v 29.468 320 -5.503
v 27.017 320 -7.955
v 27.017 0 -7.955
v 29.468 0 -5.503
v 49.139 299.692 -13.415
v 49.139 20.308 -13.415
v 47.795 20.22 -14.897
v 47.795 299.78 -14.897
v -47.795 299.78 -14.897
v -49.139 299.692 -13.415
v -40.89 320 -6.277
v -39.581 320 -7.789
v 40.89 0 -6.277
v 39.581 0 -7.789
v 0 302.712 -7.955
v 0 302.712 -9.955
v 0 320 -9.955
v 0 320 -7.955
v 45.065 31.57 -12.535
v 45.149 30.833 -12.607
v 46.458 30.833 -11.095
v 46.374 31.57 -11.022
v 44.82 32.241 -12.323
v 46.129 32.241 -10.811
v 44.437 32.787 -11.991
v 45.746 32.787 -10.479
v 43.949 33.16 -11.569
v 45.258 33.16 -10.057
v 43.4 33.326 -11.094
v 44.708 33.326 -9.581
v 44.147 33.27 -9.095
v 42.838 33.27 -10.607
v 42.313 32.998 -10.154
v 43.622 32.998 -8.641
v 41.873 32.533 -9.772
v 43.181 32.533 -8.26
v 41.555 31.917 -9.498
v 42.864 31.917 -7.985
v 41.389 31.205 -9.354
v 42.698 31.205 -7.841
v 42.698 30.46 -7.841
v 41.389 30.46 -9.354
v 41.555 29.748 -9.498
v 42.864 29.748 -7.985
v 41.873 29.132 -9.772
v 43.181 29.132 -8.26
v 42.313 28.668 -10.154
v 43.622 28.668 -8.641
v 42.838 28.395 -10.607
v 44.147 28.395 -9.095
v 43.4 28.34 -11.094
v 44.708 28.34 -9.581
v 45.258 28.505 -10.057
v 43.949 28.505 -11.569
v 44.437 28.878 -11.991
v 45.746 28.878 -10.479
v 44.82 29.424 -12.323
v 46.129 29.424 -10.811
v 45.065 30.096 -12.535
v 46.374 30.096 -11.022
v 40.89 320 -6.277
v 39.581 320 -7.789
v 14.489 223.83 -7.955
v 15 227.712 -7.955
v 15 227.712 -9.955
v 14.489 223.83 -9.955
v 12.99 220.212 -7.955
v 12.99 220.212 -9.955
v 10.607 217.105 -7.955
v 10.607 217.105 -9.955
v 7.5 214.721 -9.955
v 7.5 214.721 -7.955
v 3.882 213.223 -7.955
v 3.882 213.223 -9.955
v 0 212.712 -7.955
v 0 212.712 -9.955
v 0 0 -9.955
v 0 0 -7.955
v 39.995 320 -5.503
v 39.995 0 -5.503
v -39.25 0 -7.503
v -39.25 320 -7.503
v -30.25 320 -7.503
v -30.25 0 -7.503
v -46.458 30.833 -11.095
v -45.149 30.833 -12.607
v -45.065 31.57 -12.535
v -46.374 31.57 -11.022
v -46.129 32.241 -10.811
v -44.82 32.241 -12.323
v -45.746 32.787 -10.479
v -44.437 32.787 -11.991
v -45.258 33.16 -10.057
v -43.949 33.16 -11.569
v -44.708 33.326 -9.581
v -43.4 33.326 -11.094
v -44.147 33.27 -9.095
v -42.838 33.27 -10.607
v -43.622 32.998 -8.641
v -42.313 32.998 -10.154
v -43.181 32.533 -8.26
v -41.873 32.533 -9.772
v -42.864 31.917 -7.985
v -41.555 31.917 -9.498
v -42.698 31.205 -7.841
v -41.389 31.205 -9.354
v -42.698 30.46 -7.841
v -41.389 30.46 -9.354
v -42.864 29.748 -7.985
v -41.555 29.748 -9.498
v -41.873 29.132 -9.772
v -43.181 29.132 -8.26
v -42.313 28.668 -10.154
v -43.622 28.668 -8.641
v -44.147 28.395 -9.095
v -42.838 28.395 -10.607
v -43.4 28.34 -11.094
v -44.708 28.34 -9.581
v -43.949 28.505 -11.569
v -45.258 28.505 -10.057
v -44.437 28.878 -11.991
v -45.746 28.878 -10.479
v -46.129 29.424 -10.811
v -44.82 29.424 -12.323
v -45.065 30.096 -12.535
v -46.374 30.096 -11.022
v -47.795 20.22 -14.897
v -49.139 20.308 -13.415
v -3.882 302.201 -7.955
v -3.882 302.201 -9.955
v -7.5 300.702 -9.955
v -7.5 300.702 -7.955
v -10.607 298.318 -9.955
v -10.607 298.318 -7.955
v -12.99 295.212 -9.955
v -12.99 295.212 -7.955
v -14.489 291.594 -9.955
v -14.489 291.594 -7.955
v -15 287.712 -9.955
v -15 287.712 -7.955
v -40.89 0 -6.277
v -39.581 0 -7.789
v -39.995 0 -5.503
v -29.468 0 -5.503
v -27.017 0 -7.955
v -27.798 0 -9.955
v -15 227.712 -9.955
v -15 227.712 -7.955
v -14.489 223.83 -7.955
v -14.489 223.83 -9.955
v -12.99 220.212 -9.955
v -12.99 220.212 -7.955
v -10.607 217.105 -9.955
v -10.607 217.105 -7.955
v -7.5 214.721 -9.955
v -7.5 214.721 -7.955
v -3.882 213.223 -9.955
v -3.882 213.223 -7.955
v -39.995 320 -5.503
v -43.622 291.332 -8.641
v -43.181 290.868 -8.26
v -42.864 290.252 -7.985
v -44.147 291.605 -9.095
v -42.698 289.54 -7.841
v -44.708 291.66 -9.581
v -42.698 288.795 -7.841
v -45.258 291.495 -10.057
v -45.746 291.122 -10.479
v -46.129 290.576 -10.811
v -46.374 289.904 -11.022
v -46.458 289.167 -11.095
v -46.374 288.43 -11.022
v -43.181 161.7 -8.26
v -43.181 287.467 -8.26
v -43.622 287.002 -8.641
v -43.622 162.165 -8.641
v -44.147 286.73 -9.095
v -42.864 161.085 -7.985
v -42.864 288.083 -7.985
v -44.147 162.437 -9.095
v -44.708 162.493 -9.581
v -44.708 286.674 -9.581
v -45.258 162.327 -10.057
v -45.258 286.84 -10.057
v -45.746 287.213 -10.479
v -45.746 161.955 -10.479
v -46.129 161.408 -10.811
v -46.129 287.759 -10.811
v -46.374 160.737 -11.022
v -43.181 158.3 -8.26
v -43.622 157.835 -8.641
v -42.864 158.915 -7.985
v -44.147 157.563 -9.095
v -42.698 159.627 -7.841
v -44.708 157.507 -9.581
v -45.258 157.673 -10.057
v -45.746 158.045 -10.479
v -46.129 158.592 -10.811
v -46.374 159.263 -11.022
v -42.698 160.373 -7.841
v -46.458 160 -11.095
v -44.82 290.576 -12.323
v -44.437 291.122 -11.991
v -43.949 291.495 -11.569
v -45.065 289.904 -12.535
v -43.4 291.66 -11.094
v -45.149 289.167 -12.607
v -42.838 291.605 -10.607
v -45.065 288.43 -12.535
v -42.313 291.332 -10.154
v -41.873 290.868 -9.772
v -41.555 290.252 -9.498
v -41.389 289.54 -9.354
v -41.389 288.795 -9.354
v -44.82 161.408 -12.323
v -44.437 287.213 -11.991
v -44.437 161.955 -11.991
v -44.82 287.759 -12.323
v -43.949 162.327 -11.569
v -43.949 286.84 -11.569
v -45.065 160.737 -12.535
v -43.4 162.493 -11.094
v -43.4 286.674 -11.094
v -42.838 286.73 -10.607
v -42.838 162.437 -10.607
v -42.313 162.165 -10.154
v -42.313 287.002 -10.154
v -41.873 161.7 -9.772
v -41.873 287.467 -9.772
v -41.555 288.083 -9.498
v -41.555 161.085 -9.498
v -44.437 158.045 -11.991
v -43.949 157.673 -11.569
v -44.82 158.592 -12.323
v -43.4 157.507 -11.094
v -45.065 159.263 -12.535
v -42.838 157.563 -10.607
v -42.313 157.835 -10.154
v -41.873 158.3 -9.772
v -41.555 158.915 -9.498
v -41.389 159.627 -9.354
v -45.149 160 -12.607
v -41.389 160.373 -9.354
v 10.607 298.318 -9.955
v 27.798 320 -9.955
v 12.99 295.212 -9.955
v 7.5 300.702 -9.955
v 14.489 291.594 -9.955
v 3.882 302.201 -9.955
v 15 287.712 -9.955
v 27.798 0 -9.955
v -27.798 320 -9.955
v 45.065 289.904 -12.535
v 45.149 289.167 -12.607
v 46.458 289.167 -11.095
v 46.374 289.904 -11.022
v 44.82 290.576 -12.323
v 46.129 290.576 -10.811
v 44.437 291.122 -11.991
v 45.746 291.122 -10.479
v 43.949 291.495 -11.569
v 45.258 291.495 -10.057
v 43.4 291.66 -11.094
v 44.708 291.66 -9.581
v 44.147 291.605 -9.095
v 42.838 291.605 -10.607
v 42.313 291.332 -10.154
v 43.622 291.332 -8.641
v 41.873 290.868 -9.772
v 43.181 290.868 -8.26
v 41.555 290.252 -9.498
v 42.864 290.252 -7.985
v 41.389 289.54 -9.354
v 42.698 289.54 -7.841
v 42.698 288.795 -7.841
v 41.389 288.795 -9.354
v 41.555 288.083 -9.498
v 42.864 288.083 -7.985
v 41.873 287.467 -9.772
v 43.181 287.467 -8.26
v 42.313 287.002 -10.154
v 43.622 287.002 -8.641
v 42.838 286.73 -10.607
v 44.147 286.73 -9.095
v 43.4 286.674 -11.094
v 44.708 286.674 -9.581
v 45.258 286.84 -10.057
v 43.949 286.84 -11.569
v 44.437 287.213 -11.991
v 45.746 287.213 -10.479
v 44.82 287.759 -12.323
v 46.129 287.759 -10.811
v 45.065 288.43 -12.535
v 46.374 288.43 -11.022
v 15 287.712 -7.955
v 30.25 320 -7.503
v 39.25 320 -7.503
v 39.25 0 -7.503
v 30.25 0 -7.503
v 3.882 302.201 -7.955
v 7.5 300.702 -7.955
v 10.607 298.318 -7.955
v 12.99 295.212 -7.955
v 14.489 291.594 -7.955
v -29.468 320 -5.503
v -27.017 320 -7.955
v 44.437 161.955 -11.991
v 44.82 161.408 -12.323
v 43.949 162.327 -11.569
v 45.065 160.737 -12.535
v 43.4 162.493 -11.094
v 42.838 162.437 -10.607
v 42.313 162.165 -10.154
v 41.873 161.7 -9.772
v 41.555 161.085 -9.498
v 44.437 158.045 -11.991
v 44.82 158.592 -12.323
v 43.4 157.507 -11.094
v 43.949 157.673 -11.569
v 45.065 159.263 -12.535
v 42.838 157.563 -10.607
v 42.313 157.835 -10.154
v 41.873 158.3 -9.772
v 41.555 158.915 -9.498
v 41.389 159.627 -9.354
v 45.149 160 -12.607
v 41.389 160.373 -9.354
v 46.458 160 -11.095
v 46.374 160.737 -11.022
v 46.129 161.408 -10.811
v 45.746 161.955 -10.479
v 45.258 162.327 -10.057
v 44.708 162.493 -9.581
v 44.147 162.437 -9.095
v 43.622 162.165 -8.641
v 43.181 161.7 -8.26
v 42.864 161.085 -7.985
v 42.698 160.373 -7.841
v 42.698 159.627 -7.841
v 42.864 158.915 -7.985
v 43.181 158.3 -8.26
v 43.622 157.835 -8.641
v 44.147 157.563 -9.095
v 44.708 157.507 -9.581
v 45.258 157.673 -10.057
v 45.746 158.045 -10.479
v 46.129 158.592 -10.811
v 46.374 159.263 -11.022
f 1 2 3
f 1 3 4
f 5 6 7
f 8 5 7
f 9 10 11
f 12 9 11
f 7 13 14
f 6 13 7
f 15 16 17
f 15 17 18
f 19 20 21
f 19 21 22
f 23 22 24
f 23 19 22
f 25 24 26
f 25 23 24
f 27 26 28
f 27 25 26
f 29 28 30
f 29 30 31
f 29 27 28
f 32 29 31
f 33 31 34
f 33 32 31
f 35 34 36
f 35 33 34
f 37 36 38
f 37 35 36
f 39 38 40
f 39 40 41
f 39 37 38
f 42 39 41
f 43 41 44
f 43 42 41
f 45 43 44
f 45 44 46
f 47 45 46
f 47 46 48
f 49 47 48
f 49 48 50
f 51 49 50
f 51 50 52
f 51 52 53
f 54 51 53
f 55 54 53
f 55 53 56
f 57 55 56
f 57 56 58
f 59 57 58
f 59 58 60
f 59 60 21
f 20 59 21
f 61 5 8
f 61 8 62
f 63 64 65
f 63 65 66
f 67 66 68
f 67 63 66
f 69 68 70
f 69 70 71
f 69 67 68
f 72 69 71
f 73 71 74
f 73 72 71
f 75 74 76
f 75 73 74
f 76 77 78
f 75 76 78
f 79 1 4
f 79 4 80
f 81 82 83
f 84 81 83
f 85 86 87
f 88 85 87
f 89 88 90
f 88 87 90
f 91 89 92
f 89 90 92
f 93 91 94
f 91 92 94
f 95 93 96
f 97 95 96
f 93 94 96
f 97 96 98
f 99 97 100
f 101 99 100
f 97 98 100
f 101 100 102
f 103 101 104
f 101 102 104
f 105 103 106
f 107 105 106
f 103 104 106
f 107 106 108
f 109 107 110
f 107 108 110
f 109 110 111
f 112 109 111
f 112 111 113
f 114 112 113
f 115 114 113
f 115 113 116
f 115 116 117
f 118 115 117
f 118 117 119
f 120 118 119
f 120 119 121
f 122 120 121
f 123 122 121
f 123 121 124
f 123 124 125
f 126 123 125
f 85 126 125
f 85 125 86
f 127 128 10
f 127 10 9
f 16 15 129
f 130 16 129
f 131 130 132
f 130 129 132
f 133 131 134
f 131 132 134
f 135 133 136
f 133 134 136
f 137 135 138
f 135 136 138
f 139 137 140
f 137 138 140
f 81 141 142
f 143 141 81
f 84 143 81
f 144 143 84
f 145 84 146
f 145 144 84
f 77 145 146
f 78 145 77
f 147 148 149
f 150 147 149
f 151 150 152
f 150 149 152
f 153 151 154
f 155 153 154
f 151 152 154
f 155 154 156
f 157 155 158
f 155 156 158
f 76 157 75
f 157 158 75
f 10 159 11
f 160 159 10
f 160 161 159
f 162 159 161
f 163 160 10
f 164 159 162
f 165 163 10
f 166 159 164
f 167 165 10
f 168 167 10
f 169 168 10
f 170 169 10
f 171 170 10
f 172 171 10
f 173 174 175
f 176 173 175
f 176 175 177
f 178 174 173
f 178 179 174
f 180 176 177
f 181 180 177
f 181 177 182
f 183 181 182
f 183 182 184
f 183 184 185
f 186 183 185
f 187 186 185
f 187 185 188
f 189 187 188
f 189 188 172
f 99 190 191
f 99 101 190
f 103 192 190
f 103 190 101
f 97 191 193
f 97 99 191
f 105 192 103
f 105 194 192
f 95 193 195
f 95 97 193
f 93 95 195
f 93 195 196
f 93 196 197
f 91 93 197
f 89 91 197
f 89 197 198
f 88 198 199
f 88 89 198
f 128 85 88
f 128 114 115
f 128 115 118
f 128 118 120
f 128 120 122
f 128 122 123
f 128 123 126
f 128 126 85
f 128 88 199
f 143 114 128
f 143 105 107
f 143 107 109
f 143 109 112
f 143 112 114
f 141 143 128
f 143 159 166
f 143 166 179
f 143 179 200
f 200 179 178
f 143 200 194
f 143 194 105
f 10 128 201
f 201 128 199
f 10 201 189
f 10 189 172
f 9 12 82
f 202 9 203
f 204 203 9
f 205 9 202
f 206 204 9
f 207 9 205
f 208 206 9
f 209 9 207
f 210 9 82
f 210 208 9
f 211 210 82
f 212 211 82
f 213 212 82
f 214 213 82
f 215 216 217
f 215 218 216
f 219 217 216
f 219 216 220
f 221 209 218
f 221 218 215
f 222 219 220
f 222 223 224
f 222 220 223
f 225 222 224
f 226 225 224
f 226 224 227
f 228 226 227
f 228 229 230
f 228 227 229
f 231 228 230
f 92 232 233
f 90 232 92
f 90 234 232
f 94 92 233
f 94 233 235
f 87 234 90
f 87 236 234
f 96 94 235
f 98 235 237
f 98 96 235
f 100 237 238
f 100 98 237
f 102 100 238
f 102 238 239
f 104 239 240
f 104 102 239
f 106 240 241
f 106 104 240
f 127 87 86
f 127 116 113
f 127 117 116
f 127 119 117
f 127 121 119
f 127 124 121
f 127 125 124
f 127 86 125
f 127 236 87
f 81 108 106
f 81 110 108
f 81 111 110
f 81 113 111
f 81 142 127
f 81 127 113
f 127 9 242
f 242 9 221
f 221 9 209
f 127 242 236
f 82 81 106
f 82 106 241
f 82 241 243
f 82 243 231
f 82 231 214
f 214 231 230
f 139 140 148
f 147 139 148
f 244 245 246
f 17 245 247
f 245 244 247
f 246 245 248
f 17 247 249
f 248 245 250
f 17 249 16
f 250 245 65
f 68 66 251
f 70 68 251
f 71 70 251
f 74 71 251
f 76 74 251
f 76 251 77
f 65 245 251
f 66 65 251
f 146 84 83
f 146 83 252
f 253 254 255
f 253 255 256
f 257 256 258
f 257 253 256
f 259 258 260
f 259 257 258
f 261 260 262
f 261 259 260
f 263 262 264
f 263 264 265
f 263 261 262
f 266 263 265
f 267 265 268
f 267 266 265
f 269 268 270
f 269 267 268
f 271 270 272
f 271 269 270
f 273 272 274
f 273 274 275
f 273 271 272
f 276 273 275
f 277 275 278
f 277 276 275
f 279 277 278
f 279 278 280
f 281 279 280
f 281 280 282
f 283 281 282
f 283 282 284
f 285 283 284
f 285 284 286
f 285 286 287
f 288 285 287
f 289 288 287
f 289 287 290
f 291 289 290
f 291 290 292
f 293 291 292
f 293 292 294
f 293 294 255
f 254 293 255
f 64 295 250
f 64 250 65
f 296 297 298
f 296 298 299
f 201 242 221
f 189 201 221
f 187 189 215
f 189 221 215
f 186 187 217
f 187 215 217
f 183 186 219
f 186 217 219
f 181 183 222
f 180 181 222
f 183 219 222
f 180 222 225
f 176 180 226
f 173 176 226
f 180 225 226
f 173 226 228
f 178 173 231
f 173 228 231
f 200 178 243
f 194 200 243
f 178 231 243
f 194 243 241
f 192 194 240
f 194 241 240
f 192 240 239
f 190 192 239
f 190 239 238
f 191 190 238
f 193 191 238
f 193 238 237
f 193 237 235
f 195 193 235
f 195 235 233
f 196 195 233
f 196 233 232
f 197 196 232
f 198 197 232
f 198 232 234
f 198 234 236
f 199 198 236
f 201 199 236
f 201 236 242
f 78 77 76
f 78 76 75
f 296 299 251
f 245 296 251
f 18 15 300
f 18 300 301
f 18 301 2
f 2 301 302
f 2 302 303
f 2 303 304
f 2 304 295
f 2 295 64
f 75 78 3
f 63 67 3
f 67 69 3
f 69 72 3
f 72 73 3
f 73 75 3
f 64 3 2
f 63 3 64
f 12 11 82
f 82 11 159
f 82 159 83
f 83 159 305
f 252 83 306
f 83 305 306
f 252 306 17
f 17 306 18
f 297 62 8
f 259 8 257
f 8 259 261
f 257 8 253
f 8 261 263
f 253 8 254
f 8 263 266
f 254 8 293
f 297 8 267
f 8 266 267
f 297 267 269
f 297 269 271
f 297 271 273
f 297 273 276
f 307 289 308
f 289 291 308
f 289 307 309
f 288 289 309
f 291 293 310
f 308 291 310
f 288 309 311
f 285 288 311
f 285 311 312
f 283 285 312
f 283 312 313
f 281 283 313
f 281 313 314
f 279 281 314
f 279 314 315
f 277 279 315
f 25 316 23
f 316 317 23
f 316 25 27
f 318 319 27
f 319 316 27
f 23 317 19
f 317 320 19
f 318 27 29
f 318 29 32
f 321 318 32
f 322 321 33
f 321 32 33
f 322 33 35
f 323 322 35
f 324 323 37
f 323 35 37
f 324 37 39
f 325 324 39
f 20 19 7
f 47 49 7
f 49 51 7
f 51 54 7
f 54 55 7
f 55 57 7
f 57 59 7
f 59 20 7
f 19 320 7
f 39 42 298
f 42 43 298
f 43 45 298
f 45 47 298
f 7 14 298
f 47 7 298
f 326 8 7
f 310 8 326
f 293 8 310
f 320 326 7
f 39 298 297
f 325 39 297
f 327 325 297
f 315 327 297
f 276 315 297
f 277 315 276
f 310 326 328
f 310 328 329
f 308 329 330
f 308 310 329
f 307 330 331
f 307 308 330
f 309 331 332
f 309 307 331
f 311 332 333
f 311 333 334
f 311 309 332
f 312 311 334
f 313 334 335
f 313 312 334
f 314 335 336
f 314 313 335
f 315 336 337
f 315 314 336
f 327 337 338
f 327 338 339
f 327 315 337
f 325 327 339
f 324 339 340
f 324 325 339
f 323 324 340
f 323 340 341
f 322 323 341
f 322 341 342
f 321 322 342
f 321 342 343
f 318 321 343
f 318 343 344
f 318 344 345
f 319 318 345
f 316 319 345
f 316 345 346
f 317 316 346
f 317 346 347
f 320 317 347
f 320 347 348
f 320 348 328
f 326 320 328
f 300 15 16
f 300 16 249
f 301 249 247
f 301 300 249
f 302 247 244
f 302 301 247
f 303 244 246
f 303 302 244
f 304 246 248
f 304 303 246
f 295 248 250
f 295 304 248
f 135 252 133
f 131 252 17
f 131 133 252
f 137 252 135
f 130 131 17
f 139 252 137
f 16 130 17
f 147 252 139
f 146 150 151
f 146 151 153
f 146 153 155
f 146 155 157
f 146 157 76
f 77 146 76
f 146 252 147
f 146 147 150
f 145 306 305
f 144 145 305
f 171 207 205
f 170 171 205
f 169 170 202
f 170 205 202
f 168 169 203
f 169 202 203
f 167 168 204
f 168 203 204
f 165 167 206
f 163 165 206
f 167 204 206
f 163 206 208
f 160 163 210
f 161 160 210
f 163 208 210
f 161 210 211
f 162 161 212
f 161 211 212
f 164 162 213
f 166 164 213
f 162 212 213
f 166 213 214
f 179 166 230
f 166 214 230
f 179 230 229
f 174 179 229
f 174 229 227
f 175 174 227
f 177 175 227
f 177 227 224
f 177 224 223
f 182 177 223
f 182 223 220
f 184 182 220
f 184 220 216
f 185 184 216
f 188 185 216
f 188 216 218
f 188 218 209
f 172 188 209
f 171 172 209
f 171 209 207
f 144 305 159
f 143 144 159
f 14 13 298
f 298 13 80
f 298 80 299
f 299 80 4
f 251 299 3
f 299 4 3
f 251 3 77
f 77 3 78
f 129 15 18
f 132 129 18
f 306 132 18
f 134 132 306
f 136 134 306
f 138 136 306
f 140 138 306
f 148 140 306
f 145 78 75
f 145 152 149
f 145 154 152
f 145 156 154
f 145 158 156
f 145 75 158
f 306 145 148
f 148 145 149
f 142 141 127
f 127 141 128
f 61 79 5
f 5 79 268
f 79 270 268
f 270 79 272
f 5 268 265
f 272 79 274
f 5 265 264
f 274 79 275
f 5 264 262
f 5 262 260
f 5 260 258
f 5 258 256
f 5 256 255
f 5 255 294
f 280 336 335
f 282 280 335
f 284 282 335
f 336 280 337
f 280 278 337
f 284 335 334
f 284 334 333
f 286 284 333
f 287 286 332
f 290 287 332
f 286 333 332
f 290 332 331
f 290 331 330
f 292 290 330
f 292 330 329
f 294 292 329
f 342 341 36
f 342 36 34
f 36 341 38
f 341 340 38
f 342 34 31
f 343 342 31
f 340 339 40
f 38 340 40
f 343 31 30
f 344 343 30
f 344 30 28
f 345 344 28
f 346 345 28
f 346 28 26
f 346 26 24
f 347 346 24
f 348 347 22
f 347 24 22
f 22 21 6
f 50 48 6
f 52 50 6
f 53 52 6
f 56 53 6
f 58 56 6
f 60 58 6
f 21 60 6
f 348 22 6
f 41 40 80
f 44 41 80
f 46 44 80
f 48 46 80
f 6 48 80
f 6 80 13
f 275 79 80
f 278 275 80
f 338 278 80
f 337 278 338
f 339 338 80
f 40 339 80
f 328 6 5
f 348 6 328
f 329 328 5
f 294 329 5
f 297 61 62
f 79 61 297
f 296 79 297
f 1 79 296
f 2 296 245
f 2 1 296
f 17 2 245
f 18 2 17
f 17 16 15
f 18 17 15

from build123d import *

# Parameters (mm, degrees)
F2_DEPTH = 320
F4_D     = 5
F6_DEPTH = 6.9430588345
F8_DEPTH = 33.2750494181


with BuildPart() as f2:
    # F0 (on Front) → F2 (new body)
    with BuildSketch(Plane.XZ):
        Polygon((-29.4684734557, -5.5029067088), (-39.995180622, -5.5029067088), (-49.1391739397, -13.415253299), (-47.7946186635, -14.8966111875), (-39.25, -7.5029067088), (-30.25, -7.5029067088), (-27.7983543557, -9.954552353), (0, -9.954552353), (0, -7.954552353), (-27.0168278114, -7.954552353), align=None)
    extrude(amount=-F2_DEPTH)

    # F4 (through all)
    with Locations(Plane(origin=(-14.4015917944, 0, 16.6433633349), x_dir=(0.756198331, 0, 0.6543424823), z_dir=(-0.6543424823, 0, 0.756198331))):
        with Locations((-39.8911029679, 289.1673445702), (-39.8911029679, 160), (-39.8911029679, 30.8326554298)):
            Hole(F4_D / 2)

    # F5 (on face) → F6 (cut, through all)
    with BuildSketch(Plane.XY.offset(-7.954552353)):
        with BuildLine():
            ThreePointArc((0, 302.7118790613), (-10.6066017178, 298.3184807791), (-15, 287.7118790613))
            Line((-15, 287.7118790613), (-15, 227.7118790613))
            ThreePointArc((-15, 227.7118790613), (-10.6066017178, 217.1052773435), (0, 212.7118790613))
            Line((0, 212.7118790613), (0, 302.7118790613))
        make_face()
    extrude(amount=-F6_DEPTH, mode=Mode.SUBTRACT)

    # F7 (on face) → F8 (cut, through all)
    with BuildSketch(Plane(origin=(-14.4015917944, 0, 16.6433633349), x_dir=(0.756198331, 0, 0.6543424823), z_dir=(-0.6543424823, 0, 0.756198331))):
        Polygon((-45.9371314651, 299.6921412), (-35.0280794706, 320), (-45.9371314651, 320), align=None)
        Polygon((-35.0280794706, 0), (-45.9371314651, 20.3078588), (-45.9371314651, 0), align=None)
    extrude(amount=-F8_DEPTH, mode=Mode.SUBTRACT)


with BuildPart() as f10_1:
    # F10: instance of F2
    add(f2.part.mirror(Plane(origin=(0, 260, 0), x_dir=(0, 0, 1), z_dir=(-1, 0, 0))))


solid = Compound([f2.part, f10_1.part])
